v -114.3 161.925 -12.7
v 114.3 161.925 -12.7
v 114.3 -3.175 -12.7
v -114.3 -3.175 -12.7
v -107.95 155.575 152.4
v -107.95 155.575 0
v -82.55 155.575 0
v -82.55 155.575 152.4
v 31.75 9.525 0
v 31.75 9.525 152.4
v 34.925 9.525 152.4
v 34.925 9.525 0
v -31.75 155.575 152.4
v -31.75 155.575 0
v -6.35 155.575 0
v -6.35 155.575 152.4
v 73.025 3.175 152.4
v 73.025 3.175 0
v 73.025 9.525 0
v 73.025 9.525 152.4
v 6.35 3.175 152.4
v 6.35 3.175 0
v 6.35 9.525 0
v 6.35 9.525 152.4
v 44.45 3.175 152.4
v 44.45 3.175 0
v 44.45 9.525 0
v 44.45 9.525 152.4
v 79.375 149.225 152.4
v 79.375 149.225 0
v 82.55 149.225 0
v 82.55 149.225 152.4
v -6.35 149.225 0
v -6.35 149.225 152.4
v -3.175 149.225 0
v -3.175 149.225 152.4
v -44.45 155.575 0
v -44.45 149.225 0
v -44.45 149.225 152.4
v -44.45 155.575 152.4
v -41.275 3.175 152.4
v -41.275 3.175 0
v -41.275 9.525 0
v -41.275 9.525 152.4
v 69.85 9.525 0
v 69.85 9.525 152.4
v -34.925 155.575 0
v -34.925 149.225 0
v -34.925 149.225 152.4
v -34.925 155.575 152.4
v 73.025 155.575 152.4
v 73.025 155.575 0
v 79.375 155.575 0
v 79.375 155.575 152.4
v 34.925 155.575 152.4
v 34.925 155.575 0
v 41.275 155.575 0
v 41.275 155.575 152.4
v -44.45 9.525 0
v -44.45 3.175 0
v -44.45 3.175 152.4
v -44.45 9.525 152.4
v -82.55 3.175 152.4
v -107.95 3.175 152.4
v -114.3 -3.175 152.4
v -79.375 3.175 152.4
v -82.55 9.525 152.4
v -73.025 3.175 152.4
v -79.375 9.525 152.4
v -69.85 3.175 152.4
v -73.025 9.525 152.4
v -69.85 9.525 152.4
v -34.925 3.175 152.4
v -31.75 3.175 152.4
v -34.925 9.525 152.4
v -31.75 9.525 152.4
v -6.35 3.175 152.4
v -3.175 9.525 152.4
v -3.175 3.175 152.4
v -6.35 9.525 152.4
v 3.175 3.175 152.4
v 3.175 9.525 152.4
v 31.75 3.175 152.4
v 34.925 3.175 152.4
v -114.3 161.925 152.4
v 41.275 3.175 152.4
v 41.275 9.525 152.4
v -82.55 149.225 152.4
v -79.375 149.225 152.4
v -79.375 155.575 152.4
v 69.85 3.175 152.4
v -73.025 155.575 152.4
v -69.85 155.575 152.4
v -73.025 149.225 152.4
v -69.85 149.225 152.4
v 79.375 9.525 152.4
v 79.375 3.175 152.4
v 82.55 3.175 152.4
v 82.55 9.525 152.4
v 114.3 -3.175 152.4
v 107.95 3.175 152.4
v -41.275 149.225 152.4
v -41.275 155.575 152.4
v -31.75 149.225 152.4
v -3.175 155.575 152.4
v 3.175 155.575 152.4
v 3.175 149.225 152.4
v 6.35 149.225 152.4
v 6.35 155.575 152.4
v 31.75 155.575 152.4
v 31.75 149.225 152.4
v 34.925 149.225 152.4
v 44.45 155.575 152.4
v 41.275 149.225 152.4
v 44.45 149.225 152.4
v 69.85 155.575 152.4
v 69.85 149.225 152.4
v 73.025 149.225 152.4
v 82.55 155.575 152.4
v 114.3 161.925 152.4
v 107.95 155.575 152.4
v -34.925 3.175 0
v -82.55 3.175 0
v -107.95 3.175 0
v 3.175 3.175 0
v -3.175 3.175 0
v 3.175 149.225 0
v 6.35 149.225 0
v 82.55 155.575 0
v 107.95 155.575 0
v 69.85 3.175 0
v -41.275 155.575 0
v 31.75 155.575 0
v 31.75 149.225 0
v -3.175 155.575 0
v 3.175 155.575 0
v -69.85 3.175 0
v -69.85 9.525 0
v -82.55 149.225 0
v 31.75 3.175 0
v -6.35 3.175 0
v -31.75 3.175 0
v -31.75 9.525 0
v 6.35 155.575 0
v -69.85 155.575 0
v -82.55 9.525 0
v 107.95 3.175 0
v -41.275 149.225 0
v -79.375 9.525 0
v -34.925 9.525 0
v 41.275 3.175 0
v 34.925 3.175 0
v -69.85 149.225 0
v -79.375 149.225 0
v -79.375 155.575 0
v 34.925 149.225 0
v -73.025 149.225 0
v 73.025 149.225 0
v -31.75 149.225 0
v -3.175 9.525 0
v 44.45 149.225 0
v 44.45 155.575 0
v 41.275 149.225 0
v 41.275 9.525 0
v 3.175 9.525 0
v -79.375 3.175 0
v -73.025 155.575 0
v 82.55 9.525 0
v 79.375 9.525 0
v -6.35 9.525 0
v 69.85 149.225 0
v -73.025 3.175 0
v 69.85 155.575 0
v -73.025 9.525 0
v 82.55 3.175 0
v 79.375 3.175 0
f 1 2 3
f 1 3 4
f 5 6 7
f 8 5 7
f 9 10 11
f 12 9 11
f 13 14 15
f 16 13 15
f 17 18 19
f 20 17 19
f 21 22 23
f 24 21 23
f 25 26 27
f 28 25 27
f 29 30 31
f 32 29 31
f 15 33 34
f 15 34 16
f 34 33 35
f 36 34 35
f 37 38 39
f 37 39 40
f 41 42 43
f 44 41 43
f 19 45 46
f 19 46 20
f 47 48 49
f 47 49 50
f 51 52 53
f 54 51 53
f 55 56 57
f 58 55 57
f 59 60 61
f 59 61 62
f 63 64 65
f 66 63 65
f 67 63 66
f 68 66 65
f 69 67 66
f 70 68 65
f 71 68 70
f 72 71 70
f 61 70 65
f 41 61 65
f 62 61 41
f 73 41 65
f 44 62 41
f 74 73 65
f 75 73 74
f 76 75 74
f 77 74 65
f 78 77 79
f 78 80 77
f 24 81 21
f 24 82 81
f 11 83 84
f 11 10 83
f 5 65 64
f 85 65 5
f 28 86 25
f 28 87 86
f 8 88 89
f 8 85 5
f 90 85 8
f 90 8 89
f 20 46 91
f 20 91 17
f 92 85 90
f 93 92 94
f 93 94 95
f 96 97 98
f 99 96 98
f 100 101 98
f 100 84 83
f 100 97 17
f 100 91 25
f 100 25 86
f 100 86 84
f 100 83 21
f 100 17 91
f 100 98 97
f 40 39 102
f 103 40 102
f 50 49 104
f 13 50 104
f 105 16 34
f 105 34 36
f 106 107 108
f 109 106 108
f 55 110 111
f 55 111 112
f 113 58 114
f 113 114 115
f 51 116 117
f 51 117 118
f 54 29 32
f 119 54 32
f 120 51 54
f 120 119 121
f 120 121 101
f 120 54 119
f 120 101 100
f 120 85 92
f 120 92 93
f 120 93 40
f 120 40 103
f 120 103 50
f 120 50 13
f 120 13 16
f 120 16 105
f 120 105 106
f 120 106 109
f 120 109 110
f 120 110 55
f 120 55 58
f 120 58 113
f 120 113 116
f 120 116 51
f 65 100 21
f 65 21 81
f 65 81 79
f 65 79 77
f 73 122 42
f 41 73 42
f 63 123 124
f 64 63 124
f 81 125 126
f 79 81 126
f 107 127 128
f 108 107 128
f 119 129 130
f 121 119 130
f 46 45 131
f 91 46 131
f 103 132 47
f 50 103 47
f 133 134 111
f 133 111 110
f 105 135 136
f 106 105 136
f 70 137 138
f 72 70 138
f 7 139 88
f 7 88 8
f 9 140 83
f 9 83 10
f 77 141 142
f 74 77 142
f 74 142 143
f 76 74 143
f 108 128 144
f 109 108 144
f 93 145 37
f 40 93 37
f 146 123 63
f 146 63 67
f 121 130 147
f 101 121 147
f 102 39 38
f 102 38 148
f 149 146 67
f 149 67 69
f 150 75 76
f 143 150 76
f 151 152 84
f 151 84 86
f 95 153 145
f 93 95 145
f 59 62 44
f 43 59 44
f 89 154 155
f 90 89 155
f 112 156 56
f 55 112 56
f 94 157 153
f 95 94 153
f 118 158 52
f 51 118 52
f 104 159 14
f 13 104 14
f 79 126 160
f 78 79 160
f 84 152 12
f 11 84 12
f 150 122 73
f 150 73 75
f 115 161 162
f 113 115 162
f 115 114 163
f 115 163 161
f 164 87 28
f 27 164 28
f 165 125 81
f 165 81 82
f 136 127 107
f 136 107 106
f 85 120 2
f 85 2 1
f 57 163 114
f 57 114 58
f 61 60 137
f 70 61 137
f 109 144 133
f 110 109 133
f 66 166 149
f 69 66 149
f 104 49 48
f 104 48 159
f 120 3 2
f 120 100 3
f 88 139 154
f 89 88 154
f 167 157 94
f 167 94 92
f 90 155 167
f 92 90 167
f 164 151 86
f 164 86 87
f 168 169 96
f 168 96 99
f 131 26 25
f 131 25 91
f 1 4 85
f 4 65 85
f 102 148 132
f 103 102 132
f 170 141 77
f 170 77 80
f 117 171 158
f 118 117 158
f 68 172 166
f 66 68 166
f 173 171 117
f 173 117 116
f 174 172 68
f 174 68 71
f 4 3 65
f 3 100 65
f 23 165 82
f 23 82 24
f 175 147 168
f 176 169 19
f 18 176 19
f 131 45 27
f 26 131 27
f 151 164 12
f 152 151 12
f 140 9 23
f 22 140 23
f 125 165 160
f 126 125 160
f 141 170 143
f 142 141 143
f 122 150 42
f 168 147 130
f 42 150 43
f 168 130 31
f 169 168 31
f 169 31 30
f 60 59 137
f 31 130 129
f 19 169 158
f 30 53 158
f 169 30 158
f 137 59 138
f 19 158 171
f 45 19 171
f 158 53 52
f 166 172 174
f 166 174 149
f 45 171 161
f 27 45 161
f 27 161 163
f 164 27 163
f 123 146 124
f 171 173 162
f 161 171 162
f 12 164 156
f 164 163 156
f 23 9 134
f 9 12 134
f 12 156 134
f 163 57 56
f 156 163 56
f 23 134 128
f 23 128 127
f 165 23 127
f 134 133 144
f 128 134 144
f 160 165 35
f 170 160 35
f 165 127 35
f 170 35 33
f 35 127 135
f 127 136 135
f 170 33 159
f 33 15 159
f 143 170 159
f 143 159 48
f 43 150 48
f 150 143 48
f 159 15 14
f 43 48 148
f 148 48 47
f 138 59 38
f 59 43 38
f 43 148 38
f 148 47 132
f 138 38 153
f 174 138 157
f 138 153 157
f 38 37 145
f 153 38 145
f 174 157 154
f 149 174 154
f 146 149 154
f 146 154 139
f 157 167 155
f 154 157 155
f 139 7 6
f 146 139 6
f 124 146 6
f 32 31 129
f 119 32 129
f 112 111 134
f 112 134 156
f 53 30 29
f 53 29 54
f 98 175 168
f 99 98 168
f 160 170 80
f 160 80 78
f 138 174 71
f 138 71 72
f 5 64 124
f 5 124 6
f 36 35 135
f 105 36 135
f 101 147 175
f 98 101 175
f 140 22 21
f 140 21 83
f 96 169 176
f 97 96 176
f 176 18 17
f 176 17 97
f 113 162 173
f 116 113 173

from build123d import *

# Parameters (mm, degrees)
SKETCH2_W           = 6.35
SKETCH2_H           = 152.4
SKETCH2_H_2         = 6.35
SKETCH2_W_2         = 25.4
SKETCH2_W_3         = 3.175
BOSS_EXTRUDE1_DEPTH = 152.4
SKETCH3_W           = 228.6
SKETCH3_H           = 165.1
BOSS_EXTRUDE2_DEPTH = 12.7


with BuildPart() as part:
    # Sketch2 → Boss-Extrude1 (new body)
    with BuildSketch(Plane.XY):
        with Locations((-111.125, 79.375)):
            Rectangle(SKETCH2_W, SKETCH2_H)
        with Locations((-111.125, 158.75)):
            Rectangle(SKETCH2_W, SKETCH2_H_2)
        with Locations((-95.25, 158.75)):
            Rectangle(SKETCH2_W_2, SKETCH2_H_2)
        with Locations((-80.9625, 158.75)):
            Rectangle(SKETCH2_W_3, SKETCH2_H_2)
        with Locations((-76.2, 158.75)):
            Rectangle(SKETCH2_W, SKETCH2_H_2)
        with Locations((-71.4375, 158.75)):
            Rectangle(SKETCH2_W_3, SKETCH2_H_2)
        with Locations((-57.15, 158.75)):
            Rectangle(SKETCH2_W_2, SKETCH2_H_2)
        with Locations((-42.8625, 158.75)):
            Rectangle(SKETCH2_W_3, SKETCH2_H_2)
        with Locations((-42.8625, 152.4)):
            Rectangle(SKETCH2_W_3, SKETCH2_H_2)
        with Locations((-38.1, 158.75)):
            Rectangle(SKETCH2_W, SKETCH2_H_2)
        with Locations((-33.3375, 158.75)):
            Rectangle(SKETCH2_W_3, SKETCH2_H_2)
        with Locations((-33.3375, 152.4)):
            Rectangle(SKETCH2_W_3, SKETCH2_H_2)
        with Locations((-19.05, 158.75)):
            Rectangle(SKETCH2_W_2, SKETCH2_H_2)
        with Locations((-4.7625, 158.75)):
            Rectangle(SKETCH2_W_3, SKETCH2_H_2)
        with Locations((-4.7625, 152.4)):
            Rectangle(SKETCH2_W_3, SKETCH2_H_2)
        with Locations((0, 158.75)):
            Rectangle(SKETCH2_W, SKETCH2_H_2)
        with Locations((4.7625, 158.75)):
            Rectangle(SKETCH2_W_3, SKETCH2_H_2)
        with Locations((4.7625, 152.4)):
            Rectangle(SKETCH2_W_3, SKETCH2_H_2)
        with Locations((19.05, 158.75)):
            Rectangle(SKETCH2_W_2, SKETCH2_H_2)
        with Locations((33.3375, 158.75)):
            Rectangle(SKETCH2_W_3, SKETCH2_H_2)
        with Locations((38.1, 158.75)):
            Rectangle(SKETCH2_W, SKETCH2_H_2)
        with Locations((33.3375, 152.4)):
            Rectangle(SKETCH2_W_3, SKETCH2_H_2)
        with Locations((42.8625, 152.4)):
            Rectangle(SKETCH2_W_3, SKETCH2_H_2)
        with Locations((42.8625, 158.75)):
            Rectangle(SKETCH2_W_3, SKETCH2_H_2)
        with Locations((57.15, 158.75)):
            Rectangle(SKETCH2_W_2, SKETCH2_H_2)
        with Locations((71.4375, 158.75)):
            Rectangle(SKETCH2_W_3, SKETCH2_H_2)
        with Locations((71.4375, 152.4)):
            Rectangle(SKETCH2_W_3, SKETCH2_H_2)
        with Locations((76.2, 158.75)):
            Rectangle(SKETCH2_W, SKETCH2_H_2)
        with Locations((80.9625, 158.75)):
            Rectangle(SKETCH2_W_3, SKETCH2_H_2)
        with Locations((80.9625, 152.4)):
            Rectangle(SKETCH2_W_3, SKETCH2_H_2)
        with Locations((95.25, 158.75)):
            Rectangle(SKETCH2_W_2, SKETCH2_H_2)
        with Locations((111.125, 158.75)):
            Rectangle(SKETCH2_W, SKETCH2_H_2)
        with Locations((111.125, 79.375)):
            Rectangle(SKETCH2_W, SKETCH2_H)
        with Locations((-111.125, 0)):
            Rectangle(SKETCH2_W, SKETCH2_H_2)
        with Locations((-95.25, 0)):
            Rectangle(SKETCH2_W_2, SKETCH2_H_2)
        with Locations((-80.9625, 0)):
            Rectangle(SKETCH2_W_3, SKETCH2_H_2)
        with Locations((-80.9625, 6.35)):
            Rectangle(SKETCH2_W_3, SKETCH2_H_2)
        with Locations((-76.2, 0)):
            Rectangle(SKETCH2_W, SKETCH2_H_2)
        with Locations((-71.4375, 0)):
            Rectangle(SKETCH2_W_3, SKETCH2_H_2)
        with Locations((-71.4375, 6.35)):
            Rectangle(SKETCH2_W_3, SKETCH2_H_2)
        with Locations((-57.15, 0)):
            Rectangle(SKETCH2_W_2, SKETCH2_H_2)
        with Locations((-42.8625, 0)):
            Rectangle(SKETCH2_W_3, SKETCH2_H_2)
        with Locations((-42.8625, 6.35)):
            Rectangle(SKETCH2_W_3, SKETCH2_H_2)
        with Locations((-38.1, 0)):
            Rectangle(SKETCH2_W, SKETCH2_H_2)
        with Locations((-33.3375, 0)):
            Rectangle(SKETCH2_W_3, SKETCH2_H_2)
        with Locations((-33.3375, 6.35)):
            Rectangle(SKETCH2_W_3, SKETCH2_H_2)
        with Locations((-19.05, 0)):
            Rectangle(SKETCH2_W_2, SKETCH2_H_2)
        with Locations((-4.7625, 0)):
            Rectangle(SKETCH2_W_3, SKETCH2_H_2)
        with Locations((-4.7625, 6.35)):
            Rectangle(SKETCH2_W_3, SKETCH2_H_2)
        Rectangle(SKETCH2_W, SKETCH2_H_2)
        with Locations((4.7625, 0)):
            Rectangle(SKETCH2_W_3, SKETCH2_H_2)
        with Locations((4.7625, 6.35)):
            Rectangle(SKETCH2_W_3, SKETCH2_H_2)
        with Locations((19.05, 0)):
            Rectangle(SKETCH2_W_2, SKETCH2_H_2)
        with Locations((111.125, 0)):
            Rectangle(SKETCH2_W, SKETCH2_H_2)
        with Locations((95.25, 0)):
            Rectangle(SKETCH2_W_2, SKETCH2_H_2)
        with Locations((80.9625, 0)):
            Rectangle(SKETCH2_W_3, SKETCH2_H_2)
        with Locations((80.9625, 6.35)):
            Rectangle(SKETCH2_W_3, SKETCH2_H_2)
        with Locations((71.4375, 6.35)):
            Rectangle(SKETCH2_W_3, SKETCH2_H_2)
        with Locations((76.2, 0)):
            Rectangle(SKETCH2_W, SKETCH2_H_2)
        with Locations((71.4375, 0)):
            Rectangle(SKETCH2_W_3, SKETCH2_H_2)
        with Locations((57.15, 0)):
            Rectangle(SKETCH2_W_2, SKETCH2_H_2)
        with Locations((42.8625, 6.35)):
            Rectangle(SKETCH2_W_3, SKETCH2_H_2)
        with Locations((33.3375, 6.35)):
            Rectangle(SKETCH2_W_3, SKETCH2_H_2)
        with Locations((33.3375, 0)):
            Rectangle(SKETCH2_W_3, SKETCH2_H_2)
        with Locations((38.1, 0)):
            Rectangle(SKETCH2_W, SKETCH2_H_2)
        with Locations((42.8625, 0)):
            Rectangle(SKETCH2_W_3, SKETCH2_H_2)
        with Locations((-80.9625, 152.4)):
            Rectangle(SKETCH2_W_3, SKETCH2_H_2)
        with Locations((-71.4375, 152.4)):
            Rectangle(SKETCH2_W_3, SKETCH2_H_2)
    extrude(amount=BOSS_EXTRUDE1_DEPTH)

    # Sketch3 → Boss-Extrude2 (add)
    with BuildSketch(Plane(origin=(0, 0, 0), x_dir=(-1, 0, 0), z_dir=(0, 0, -1))):
        with Locations((0, 79.375)):
            Rectangle(SKETCH3_W, SKETCH3_H)
    extrude(amount=BOSS_EXTRUDE2_DEPTH)


solid = part.part
